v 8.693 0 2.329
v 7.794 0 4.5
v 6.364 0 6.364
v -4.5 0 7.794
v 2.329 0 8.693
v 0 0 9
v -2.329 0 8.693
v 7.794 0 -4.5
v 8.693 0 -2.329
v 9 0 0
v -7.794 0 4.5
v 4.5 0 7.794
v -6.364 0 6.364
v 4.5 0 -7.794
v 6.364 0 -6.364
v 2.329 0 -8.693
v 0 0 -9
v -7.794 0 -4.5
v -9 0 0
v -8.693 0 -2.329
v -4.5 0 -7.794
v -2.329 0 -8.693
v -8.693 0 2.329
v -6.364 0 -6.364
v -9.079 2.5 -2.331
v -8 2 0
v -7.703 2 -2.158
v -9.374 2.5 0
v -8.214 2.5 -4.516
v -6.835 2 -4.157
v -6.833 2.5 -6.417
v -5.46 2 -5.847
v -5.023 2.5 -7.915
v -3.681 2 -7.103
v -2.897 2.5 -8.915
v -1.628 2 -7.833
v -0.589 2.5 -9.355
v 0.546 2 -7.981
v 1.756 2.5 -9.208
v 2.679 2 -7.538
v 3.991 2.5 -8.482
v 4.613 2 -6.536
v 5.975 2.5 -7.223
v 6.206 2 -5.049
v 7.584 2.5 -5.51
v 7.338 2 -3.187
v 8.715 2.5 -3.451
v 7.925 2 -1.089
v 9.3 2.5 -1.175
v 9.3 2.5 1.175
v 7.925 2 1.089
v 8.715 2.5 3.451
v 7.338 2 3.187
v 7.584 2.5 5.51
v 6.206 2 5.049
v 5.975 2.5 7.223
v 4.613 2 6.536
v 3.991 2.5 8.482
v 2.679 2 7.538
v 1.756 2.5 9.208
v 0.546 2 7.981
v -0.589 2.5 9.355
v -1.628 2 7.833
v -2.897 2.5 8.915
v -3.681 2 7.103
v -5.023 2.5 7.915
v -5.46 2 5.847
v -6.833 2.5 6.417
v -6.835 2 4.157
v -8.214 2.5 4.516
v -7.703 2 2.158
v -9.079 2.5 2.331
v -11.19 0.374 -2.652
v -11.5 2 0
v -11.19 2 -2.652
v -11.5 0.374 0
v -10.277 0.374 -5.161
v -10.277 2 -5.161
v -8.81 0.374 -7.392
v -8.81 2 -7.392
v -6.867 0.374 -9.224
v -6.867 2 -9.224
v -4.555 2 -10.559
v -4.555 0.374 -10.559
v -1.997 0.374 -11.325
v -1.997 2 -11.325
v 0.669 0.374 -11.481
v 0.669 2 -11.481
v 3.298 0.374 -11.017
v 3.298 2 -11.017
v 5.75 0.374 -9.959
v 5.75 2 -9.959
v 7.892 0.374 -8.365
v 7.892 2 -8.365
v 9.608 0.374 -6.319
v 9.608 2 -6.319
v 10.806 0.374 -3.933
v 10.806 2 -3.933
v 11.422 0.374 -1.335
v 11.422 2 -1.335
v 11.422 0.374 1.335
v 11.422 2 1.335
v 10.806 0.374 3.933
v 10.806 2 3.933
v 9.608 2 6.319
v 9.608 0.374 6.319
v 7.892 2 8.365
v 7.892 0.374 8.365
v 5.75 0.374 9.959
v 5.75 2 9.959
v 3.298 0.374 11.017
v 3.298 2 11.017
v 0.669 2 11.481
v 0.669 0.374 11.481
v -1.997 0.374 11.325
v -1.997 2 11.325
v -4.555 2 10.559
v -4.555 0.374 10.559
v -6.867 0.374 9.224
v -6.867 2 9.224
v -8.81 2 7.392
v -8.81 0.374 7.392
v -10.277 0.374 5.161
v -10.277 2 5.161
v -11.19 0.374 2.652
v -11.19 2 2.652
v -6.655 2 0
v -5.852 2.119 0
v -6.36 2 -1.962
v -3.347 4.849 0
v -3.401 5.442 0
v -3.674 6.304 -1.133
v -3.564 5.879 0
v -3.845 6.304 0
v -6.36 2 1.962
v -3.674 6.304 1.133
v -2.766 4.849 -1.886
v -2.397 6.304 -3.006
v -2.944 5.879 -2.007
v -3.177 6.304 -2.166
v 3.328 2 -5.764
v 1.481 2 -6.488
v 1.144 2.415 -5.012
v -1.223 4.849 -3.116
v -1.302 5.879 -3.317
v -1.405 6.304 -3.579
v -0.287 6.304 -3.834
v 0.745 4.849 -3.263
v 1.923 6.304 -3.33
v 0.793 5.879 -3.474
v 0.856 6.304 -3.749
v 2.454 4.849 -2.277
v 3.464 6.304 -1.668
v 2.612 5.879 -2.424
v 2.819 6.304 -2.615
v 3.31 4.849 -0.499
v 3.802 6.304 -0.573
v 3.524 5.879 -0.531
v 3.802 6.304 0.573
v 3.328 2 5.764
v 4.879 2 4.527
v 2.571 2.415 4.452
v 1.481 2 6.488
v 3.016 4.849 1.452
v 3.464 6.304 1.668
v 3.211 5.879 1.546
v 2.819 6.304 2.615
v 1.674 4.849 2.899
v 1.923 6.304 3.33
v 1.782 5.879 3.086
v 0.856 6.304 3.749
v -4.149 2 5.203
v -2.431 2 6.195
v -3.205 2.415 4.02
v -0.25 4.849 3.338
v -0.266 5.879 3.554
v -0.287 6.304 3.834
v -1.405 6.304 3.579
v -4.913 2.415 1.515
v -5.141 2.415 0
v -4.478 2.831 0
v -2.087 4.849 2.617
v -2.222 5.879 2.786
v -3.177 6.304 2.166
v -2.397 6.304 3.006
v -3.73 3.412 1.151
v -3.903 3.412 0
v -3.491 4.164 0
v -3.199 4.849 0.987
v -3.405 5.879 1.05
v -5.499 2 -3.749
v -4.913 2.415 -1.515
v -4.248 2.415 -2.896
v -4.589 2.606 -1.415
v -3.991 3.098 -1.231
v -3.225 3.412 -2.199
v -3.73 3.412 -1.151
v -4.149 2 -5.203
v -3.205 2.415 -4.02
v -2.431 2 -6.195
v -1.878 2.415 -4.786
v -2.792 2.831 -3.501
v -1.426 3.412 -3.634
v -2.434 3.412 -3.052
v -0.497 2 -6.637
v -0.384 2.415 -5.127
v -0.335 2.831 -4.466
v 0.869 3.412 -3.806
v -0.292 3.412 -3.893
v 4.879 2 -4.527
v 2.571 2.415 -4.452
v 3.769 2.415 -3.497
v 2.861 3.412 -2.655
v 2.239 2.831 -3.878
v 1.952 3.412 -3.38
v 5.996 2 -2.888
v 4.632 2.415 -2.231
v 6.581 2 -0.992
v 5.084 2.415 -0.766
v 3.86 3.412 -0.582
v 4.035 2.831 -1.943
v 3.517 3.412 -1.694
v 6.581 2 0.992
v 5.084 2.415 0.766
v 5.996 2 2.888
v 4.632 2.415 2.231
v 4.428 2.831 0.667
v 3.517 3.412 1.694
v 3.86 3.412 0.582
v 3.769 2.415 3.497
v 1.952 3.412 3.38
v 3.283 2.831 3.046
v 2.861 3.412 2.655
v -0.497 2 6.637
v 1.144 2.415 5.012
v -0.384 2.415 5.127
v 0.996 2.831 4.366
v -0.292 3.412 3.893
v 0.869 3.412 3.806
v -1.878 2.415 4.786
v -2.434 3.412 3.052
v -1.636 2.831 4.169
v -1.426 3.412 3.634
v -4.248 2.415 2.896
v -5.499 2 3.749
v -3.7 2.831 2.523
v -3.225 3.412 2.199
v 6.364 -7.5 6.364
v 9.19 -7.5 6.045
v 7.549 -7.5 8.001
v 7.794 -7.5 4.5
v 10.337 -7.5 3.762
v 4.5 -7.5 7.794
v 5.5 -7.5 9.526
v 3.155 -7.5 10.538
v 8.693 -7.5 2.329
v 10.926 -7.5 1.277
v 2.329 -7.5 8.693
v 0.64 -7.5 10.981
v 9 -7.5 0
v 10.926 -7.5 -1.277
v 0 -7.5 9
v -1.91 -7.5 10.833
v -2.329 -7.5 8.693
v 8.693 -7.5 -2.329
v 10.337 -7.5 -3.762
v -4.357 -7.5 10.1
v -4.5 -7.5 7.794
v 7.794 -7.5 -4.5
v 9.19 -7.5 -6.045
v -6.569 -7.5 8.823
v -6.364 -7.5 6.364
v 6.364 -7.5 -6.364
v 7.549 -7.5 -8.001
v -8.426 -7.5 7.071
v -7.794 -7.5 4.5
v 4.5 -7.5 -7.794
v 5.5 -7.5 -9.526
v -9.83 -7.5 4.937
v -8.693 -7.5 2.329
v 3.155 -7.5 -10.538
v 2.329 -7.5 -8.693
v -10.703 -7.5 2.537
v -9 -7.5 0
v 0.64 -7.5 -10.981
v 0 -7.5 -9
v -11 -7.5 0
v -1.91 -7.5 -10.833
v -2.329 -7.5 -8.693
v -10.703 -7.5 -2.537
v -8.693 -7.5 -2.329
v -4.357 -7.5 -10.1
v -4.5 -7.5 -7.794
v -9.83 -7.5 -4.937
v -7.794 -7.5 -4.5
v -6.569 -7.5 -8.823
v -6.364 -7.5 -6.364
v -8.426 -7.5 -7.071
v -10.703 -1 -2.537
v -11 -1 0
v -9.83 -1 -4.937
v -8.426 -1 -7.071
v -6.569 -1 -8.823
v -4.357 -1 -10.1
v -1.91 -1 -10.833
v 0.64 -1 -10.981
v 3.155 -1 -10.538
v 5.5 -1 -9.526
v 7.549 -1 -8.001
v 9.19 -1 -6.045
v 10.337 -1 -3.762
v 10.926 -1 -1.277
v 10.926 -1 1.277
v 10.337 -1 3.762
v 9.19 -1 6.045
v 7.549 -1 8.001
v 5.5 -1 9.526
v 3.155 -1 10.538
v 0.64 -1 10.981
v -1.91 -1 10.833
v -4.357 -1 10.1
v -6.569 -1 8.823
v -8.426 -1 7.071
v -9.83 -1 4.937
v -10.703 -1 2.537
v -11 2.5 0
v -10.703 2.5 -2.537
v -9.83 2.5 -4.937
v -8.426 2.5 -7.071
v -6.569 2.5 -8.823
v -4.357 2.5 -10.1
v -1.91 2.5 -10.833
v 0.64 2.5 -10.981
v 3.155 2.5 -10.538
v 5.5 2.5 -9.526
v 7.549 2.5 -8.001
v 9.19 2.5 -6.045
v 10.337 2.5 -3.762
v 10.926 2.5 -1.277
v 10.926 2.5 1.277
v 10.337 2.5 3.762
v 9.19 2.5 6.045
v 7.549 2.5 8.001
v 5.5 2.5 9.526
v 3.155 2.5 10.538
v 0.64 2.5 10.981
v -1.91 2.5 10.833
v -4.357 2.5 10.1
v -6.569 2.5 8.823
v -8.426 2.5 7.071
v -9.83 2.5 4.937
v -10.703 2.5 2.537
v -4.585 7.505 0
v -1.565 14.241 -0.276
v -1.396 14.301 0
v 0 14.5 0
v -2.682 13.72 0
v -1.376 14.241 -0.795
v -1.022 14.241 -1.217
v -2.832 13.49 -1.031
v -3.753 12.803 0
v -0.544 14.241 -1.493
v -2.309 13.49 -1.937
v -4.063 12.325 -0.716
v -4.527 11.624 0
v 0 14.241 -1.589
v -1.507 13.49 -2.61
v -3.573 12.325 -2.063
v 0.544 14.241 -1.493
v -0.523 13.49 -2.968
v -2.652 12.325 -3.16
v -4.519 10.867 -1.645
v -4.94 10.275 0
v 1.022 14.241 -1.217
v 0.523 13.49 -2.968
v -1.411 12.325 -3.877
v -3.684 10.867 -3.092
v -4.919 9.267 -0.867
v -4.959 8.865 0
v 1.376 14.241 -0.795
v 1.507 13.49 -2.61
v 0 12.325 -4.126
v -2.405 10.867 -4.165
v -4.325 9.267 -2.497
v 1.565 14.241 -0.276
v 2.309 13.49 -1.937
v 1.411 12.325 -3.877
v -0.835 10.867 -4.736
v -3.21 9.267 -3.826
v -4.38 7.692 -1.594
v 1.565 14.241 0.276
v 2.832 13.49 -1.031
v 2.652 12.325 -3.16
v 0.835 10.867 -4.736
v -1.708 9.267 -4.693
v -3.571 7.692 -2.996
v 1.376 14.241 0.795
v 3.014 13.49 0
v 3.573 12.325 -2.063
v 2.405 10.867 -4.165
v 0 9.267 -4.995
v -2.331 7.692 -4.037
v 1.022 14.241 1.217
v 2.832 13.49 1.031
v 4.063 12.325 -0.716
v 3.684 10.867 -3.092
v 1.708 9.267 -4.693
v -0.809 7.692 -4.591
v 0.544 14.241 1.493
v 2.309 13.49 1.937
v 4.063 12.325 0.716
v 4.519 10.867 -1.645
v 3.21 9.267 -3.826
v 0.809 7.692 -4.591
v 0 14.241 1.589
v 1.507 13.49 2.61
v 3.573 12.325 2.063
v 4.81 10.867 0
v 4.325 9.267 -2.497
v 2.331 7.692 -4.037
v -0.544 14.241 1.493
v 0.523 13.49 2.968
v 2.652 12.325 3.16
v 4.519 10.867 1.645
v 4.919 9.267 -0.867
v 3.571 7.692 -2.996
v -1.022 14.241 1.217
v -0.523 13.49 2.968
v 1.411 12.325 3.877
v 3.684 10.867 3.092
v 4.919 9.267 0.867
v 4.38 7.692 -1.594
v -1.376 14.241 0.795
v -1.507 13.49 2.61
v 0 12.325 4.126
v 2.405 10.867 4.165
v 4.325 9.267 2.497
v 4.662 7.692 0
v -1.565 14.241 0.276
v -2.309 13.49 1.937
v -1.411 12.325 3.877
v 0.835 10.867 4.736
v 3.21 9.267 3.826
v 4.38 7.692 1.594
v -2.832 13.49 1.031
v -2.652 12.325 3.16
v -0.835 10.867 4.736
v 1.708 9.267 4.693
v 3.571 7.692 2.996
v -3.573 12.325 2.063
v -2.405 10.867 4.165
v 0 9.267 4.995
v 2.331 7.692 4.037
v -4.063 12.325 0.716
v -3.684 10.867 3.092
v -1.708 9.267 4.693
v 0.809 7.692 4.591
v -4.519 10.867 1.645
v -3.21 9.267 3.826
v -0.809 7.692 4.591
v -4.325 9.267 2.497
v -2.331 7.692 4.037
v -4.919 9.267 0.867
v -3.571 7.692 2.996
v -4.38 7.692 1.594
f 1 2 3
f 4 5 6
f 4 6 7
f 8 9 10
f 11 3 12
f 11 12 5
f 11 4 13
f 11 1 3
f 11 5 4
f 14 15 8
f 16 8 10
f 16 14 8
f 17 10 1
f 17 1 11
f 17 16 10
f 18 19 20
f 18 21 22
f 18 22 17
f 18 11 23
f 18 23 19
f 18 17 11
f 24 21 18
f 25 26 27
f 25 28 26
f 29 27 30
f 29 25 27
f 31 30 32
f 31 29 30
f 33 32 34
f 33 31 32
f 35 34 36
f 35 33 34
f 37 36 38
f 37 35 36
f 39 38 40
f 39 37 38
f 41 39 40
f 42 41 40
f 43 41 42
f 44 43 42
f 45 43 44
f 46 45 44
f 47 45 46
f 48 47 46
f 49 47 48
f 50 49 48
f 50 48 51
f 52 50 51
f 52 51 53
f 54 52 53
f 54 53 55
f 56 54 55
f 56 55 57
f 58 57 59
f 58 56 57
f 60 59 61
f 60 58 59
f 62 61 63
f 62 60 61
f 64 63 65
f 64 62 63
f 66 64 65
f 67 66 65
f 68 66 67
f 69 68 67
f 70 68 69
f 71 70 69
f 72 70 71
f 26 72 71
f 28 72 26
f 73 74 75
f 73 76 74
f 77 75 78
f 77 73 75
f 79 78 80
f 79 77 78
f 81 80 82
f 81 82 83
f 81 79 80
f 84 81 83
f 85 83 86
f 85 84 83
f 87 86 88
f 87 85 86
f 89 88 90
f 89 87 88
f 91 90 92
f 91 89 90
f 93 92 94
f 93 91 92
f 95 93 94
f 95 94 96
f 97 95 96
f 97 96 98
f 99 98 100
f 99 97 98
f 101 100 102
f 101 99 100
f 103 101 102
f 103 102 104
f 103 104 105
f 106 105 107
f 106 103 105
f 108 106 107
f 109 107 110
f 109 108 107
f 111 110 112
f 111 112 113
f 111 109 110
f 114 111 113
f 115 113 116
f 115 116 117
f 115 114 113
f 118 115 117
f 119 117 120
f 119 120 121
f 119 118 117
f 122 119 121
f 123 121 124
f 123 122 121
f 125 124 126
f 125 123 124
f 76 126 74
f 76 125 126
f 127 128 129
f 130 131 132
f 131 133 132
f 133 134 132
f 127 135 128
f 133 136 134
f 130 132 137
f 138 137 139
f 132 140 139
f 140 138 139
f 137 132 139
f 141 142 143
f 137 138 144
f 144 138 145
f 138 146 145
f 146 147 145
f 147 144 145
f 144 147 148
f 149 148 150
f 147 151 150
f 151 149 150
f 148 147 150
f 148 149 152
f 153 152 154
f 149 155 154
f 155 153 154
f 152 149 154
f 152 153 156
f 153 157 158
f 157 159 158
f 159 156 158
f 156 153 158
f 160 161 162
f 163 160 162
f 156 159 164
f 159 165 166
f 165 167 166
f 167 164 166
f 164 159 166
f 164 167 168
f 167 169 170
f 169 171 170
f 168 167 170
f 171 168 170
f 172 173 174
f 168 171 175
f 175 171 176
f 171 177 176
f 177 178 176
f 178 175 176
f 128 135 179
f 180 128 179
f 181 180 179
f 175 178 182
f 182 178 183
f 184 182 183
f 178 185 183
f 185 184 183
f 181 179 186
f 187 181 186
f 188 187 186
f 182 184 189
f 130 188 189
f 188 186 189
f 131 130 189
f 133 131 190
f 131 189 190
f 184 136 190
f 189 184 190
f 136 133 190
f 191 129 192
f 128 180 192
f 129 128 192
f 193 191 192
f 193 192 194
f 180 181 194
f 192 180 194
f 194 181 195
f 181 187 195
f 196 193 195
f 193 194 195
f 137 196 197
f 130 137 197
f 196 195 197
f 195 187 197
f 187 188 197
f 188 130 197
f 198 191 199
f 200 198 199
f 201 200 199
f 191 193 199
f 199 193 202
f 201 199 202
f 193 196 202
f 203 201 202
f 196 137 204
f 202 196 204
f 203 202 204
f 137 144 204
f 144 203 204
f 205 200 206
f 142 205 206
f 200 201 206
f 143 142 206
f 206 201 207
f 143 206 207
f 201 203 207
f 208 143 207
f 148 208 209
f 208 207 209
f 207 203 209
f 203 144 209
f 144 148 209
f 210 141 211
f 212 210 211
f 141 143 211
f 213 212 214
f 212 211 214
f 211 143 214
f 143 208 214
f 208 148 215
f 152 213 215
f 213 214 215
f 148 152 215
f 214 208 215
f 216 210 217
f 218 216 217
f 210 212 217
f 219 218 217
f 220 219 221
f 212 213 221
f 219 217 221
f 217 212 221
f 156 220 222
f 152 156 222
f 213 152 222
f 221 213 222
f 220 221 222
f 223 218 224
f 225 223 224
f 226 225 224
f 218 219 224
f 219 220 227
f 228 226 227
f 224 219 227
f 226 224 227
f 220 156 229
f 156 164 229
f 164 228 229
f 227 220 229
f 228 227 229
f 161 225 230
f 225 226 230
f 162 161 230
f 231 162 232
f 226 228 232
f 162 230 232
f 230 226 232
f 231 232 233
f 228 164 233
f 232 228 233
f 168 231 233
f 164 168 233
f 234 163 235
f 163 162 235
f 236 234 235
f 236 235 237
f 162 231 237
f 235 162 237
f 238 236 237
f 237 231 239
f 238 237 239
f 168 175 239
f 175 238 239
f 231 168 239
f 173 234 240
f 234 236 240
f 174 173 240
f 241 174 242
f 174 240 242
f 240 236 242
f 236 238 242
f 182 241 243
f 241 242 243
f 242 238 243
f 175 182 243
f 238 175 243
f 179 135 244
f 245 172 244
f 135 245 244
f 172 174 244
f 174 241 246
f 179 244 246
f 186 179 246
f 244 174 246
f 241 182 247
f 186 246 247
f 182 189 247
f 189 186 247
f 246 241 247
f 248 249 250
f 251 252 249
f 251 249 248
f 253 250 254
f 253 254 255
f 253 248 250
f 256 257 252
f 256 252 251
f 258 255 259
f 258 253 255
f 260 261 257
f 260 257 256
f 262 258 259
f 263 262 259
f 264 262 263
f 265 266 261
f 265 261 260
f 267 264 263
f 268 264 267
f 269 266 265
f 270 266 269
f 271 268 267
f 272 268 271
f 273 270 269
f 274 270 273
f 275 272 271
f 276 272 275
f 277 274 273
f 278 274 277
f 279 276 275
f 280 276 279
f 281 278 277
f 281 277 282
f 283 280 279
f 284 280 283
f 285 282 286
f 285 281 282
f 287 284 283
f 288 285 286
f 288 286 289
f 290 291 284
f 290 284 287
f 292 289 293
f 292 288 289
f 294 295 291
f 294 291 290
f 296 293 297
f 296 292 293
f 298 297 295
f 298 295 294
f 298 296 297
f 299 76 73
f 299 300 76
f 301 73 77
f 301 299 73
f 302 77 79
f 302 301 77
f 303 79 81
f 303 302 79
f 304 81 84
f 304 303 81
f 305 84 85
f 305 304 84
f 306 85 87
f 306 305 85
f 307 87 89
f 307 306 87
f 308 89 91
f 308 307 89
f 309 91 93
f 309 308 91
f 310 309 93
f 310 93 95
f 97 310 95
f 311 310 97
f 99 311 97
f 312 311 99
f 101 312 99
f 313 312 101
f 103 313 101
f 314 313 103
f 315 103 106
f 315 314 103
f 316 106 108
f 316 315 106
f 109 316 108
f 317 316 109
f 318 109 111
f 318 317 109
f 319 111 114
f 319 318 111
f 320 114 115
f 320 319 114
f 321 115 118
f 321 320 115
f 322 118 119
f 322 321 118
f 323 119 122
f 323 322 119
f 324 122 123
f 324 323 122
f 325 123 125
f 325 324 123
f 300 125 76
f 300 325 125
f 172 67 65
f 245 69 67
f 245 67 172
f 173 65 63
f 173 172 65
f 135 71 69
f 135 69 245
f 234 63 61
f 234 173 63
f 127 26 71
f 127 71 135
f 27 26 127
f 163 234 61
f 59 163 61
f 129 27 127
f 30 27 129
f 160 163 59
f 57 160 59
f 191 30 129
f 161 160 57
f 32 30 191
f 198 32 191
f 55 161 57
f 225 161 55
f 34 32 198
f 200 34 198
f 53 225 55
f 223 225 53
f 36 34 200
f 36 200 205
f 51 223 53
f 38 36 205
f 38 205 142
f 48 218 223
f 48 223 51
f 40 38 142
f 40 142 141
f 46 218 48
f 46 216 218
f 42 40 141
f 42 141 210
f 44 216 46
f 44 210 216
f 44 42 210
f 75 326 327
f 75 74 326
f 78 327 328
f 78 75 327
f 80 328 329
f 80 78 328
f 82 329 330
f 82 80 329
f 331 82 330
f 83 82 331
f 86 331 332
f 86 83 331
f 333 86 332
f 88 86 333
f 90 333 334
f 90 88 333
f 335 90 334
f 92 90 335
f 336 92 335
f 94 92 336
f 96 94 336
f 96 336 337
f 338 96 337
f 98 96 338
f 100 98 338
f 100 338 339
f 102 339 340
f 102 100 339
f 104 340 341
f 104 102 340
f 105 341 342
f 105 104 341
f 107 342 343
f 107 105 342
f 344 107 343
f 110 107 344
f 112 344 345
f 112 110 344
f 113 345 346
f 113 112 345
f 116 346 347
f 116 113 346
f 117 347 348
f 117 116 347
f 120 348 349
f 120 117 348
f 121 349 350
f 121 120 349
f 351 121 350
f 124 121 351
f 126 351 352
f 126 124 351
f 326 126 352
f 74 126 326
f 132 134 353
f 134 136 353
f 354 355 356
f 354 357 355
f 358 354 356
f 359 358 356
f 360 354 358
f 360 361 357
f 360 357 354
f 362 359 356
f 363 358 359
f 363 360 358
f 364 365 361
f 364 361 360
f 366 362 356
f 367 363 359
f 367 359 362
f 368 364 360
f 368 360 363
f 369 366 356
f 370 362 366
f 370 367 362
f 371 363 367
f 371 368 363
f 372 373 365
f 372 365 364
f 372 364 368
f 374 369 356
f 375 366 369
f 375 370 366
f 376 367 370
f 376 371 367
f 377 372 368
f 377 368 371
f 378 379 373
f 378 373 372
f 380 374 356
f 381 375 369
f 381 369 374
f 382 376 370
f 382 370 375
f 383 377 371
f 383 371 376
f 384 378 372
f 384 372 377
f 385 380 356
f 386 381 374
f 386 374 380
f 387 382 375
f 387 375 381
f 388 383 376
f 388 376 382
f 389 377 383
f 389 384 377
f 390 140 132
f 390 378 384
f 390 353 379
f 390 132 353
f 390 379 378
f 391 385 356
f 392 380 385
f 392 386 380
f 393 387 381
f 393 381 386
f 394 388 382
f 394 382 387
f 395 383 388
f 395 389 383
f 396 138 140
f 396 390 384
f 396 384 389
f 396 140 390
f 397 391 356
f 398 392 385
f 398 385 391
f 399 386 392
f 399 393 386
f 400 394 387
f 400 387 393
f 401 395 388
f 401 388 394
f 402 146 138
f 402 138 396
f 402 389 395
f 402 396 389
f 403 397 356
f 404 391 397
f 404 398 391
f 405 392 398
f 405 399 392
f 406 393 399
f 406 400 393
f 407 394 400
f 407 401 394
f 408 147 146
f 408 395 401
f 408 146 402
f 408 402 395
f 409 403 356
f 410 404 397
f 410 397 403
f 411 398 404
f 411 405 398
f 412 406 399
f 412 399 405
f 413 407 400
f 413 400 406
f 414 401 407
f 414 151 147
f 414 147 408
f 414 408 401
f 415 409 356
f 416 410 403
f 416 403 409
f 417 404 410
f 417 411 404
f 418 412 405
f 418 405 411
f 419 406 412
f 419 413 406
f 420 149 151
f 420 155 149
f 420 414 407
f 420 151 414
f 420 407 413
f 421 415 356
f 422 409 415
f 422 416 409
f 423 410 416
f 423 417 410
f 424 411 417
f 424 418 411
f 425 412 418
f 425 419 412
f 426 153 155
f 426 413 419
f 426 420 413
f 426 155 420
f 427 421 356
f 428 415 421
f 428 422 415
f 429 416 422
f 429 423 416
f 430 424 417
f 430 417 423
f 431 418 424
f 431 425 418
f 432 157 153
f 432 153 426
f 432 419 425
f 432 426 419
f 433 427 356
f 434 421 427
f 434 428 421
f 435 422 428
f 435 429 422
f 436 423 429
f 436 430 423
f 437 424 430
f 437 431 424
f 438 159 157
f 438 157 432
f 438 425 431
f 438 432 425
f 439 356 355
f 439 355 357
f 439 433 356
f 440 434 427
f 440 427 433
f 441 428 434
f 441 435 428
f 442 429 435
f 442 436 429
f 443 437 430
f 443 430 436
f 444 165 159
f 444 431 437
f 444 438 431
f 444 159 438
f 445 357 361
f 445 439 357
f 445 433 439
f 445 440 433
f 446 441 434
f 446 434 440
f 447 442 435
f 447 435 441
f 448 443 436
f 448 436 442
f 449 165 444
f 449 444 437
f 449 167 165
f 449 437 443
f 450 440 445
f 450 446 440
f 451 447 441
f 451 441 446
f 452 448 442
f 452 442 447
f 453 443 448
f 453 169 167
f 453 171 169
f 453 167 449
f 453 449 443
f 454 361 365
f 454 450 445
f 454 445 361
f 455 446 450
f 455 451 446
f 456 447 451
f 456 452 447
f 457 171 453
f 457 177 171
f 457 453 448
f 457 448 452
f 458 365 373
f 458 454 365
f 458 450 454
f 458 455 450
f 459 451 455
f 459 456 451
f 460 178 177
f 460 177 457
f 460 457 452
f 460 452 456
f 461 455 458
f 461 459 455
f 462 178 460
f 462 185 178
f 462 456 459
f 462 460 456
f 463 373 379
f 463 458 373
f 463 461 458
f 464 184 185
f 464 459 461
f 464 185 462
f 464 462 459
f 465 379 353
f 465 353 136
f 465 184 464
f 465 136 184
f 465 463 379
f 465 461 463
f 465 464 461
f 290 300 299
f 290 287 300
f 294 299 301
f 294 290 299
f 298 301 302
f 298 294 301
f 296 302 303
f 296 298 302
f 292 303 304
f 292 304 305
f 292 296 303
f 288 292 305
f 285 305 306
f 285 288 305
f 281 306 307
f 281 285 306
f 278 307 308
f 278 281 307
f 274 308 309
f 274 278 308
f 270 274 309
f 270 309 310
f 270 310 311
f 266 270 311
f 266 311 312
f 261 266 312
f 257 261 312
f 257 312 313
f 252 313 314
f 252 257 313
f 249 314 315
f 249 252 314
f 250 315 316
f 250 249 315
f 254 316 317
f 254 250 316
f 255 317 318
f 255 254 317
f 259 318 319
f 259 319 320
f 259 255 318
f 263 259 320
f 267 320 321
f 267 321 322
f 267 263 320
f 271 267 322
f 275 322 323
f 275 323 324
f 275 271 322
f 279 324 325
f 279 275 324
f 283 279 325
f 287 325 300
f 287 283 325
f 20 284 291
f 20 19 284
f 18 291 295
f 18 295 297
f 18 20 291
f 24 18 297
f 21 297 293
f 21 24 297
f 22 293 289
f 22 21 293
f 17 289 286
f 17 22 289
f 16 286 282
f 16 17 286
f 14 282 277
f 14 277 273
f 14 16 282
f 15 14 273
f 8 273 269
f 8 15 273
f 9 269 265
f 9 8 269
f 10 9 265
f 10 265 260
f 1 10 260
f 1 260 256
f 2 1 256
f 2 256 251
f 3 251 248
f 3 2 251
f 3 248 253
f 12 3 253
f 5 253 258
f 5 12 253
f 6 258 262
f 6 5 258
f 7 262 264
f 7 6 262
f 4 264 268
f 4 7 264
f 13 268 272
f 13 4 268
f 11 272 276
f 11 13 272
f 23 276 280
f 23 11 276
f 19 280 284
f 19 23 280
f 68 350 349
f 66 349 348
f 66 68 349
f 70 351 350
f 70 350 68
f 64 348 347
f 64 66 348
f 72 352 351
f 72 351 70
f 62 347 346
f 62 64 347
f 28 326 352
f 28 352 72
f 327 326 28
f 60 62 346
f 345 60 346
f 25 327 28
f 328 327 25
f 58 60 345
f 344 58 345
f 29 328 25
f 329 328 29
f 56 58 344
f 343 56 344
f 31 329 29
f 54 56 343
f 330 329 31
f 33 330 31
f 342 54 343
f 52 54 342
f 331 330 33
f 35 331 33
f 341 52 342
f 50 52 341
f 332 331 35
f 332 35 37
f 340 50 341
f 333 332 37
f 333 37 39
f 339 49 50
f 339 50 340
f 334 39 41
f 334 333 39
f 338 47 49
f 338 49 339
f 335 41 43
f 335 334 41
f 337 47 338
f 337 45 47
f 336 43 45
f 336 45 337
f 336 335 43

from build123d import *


with BuildPart() as part:
    # Sketch1 → Revolve2 (revolve)
    with BuildSketch(Plane.XY):
        with BuildLine():
            Line((-9, -7.5), (-9, 0))
            Line((-9, 0), (0, 0))
            Line((0, 0), (0, 2))
            Line((0, 2), (0, 14.5))
            ThreePointArc((0, 14.5), (-4.526641021, 11.623563296), (-3.845043489, 6.303808428))
            add(Edge.make_bspline(
                [(-6.655258628, 2), (-6.120506519, 2), (-5.250490252, 2.299992699), (-3.576908903, 3.35585887), (-2.957362509, 5.235921257), (-3.845043489, 6.303808428)],
                knots=[0, 0, 0, 0, 0.245004217, 0.484762515, 1, 1, 1, 1], degree=3))
            Line((-6.655258628, 2), (-8, 2))
            Line((-8, 2), (-9.37373871, 2.5))
            Line((-9.37373871, 2.5), (-11, 2.5))
            Line((-11, 2.5), (-11.5, 2))
            Line((-11.5, 2), (-11.5, 0.37373871))
            Line((-11.5, 0.37373871), (-11, -1))
            Line((-11, -1), (-11, -7.5))
            Line((-11, -7.5), (-9, -7.5))
        make_face()
    revolve(axis=Axis((0, 14.5, 0), (0, -1, 0)))


solid = part.part
